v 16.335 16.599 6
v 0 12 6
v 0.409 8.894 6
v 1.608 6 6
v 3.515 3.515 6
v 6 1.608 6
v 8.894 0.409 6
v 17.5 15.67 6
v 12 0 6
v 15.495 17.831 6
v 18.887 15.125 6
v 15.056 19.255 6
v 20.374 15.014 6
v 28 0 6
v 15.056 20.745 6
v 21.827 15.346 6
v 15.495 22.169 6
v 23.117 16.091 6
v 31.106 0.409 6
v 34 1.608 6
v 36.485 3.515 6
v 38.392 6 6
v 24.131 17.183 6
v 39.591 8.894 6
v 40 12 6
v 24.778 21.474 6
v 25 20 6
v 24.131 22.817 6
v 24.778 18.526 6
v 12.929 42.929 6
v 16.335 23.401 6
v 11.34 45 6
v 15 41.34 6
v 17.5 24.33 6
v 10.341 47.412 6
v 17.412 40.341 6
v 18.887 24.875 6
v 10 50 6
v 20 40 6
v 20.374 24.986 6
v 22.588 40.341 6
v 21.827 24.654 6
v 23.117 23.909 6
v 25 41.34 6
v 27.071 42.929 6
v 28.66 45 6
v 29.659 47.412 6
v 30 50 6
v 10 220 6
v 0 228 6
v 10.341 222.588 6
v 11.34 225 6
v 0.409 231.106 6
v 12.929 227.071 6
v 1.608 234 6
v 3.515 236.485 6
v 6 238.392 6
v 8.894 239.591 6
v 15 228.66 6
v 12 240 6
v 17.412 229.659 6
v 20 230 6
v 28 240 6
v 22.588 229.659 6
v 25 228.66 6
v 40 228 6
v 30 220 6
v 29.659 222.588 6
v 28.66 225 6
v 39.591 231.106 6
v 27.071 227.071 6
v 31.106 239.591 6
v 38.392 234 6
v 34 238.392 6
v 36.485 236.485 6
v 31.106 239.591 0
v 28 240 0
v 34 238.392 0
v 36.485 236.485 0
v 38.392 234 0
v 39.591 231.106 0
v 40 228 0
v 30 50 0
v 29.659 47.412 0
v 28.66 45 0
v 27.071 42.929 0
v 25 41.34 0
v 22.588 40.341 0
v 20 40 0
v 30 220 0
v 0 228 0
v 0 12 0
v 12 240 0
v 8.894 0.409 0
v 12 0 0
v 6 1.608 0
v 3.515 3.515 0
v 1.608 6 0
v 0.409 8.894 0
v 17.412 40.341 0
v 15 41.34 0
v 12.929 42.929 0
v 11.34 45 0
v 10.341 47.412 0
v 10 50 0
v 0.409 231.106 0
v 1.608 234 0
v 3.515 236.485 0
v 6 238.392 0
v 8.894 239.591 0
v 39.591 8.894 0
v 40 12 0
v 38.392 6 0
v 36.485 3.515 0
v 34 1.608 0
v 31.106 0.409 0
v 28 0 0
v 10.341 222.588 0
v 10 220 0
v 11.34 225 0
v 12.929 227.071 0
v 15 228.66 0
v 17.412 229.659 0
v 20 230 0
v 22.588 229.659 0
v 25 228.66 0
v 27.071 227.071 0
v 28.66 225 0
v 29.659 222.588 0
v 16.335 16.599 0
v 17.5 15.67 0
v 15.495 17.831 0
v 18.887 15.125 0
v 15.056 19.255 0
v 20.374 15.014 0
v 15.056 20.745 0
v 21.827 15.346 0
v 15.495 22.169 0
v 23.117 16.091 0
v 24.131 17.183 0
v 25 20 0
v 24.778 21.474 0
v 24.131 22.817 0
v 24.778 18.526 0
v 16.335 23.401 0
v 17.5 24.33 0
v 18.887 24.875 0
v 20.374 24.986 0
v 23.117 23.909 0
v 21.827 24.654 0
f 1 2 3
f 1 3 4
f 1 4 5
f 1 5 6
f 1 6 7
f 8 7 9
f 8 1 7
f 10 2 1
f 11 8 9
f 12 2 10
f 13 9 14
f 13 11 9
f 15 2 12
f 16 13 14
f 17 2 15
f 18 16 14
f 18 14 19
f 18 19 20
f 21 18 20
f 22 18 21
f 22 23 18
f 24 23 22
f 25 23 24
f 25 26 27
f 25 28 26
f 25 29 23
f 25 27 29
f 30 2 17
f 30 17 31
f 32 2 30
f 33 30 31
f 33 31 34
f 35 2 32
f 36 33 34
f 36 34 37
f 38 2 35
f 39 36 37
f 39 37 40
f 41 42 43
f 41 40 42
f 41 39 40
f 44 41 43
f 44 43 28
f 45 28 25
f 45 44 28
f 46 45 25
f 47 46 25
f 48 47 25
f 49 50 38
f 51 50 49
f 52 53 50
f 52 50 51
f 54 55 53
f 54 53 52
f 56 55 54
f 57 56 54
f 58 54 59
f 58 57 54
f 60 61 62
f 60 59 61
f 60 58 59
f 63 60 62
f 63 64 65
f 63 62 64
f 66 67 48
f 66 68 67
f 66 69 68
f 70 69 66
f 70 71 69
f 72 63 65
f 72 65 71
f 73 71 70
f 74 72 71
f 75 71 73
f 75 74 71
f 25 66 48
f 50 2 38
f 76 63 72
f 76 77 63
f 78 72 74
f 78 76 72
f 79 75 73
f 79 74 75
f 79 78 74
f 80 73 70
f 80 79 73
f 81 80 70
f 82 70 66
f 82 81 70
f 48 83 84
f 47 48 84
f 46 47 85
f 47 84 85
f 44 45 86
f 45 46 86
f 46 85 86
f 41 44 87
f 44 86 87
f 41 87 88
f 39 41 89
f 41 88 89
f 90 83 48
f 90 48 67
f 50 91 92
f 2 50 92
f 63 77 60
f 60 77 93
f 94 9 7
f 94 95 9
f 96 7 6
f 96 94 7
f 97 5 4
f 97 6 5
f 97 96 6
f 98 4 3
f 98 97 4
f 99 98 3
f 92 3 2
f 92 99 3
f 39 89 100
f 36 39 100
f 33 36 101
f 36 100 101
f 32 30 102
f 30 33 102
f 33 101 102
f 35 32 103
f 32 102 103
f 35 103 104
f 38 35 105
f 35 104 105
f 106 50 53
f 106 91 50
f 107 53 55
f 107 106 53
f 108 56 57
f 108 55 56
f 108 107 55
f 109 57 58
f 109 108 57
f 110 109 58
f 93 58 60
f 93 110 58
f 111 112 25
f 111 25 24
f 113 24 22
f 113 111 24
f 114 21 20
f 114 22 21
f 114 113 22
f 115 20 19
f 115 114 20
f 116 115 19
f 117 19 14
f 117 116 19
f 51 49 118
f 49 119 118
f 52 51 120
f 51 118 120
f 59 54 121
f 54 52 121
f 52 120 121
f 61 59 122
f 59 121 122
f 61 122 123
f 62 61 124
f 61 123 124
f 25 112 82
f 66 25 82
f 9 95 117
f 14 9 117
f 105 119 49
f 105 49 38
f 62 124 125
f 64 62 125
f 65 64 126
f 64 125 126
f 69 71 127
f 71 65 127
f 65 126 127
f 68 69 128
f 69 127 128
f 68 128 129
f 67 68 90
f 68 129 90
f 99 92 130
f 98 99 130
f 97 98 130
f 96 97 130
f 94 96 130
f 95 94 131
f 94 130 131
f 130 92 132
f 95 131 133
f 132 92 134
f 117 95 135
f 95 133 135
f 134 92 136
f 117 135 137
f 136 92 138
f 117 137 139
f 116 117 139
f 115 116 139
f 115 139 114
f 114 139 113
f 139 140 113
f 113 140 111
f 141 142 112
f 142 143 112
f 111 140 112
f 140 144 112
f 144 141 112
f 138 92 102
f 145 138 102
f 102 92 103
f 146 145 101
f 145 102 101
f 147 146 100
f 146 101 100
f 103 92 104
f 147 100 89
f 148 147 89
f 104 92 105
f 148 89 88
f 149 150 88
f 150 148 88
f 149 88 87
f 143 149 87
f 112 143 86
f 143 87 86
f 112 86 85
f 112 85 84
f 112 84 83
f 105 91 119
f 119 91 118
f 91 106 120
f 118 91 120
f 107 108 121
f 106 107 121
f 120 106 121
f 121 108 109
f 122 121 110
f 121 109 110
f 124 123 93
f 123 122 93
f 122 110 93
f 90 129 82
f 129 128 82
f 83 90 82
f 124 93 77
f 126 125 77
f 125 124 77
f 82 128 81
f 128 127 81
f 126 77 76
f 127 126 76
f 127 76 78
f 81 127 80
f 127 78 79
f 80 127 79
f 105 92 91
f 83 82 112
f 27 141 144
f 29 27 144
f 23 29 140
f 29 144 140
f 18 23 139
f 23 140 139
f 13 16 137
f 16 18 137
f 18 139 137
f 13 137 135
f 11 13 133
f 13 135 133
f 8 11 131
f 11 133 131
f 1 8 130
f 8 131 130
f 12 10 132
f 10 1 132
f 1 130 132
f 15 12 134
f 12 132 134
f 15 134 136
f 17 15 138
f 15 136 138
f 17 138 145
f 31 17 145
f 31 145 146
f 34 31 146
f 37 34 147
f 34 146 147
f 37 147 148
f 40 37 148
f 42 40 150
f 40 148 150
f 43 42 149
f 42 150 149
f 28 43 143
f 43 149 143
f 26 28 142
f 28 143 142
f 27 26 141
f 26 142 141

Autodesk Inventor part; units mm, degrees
ref_plane "YZ Plane" through (0, 0, 0) normal (1, 0, 0) x (0, 1, 0)
ref_plane "XZ Plane" through (0, 0, 0) normal (0, 1, 0) x (-1, 0, 0)
ref_plane "XY Plane" through (0, 0, 0) normal (0, 0, 1) x (1, 0, 0)
sketch "Boceto1" plane through (0, 0, 0) normal (0, 0, 1) x (1, 0, 0)
  point P0 (0, 0)
sketch "Boceto2" plane through (0, 0, 0) normal (0, 0, 1) x (1, 0, 0)
  line L0 (12, 0) -> (28, 0)
  line L1 (40, 12) -> (40, 228)
  line L2 (28, 240) -> (12, 240)
  line L3 (0, 228) -> (0, 12)
  arc A0 (12, 240) -> (0, 228) centre (12, 228) ccw
  arc A1 (40, 228) -> (28, 240) centre (28, 228) ccw
  circle A2 centre (20, 20) radius 5
  line L4 (20, 40) -> (20, 40)
  line L5 (30, 50) -> (30, 220)
  line L6 (20, 230) -> (20, 230)
  line L7 (10, 220) -> (10, 50)
  line L8 (10, 40) -> (30, 230) construction
  line L9 (30, 40) -> (10, 230) construction
  arc A3 (0, 12) -> (12, 0) centre (12, 12) ccw
  arc A4 (28, 0) -> (40, 12) centre (28, 12) ccw
  arc A5 (10, 50) -> (20, 40) centre (20, 50) ccw
  arc A6 (20, 40) -> (30, 50) centre (20, 50) ccw
  arc A7 (20, 230) -> (10, 220) centre (20, 220) ccw
  arc A8 (30, 220) -> (20, 230) centre (20, 220) ccw
  point P0 (0, 0)
  point P1 (40, 240)
  point P2 (40, 0)
  point P3 (0, 240)
  point P4 (20, 0)
  point P5 (20, 135)
  point P6 (20, 40)
  point P7 (20, 230)
  point P8 (20, 240)
  dimension "d0" = 40
  dimension "d1" = 240
  dimension "d2" = 12
  dimension "d3" = 12
  dimension "d4" = 10
  dimension "d5" = 20
  dimension "d6" = 20
  dimension "d7" = 190
  dimension "d9" = 12
  dimension "d10" = 10
  dimension "d14" = 200
extrude "Extrusión1" add sketch "Boceto2" along normal blind 6
properties part number "Eslabon 2"
